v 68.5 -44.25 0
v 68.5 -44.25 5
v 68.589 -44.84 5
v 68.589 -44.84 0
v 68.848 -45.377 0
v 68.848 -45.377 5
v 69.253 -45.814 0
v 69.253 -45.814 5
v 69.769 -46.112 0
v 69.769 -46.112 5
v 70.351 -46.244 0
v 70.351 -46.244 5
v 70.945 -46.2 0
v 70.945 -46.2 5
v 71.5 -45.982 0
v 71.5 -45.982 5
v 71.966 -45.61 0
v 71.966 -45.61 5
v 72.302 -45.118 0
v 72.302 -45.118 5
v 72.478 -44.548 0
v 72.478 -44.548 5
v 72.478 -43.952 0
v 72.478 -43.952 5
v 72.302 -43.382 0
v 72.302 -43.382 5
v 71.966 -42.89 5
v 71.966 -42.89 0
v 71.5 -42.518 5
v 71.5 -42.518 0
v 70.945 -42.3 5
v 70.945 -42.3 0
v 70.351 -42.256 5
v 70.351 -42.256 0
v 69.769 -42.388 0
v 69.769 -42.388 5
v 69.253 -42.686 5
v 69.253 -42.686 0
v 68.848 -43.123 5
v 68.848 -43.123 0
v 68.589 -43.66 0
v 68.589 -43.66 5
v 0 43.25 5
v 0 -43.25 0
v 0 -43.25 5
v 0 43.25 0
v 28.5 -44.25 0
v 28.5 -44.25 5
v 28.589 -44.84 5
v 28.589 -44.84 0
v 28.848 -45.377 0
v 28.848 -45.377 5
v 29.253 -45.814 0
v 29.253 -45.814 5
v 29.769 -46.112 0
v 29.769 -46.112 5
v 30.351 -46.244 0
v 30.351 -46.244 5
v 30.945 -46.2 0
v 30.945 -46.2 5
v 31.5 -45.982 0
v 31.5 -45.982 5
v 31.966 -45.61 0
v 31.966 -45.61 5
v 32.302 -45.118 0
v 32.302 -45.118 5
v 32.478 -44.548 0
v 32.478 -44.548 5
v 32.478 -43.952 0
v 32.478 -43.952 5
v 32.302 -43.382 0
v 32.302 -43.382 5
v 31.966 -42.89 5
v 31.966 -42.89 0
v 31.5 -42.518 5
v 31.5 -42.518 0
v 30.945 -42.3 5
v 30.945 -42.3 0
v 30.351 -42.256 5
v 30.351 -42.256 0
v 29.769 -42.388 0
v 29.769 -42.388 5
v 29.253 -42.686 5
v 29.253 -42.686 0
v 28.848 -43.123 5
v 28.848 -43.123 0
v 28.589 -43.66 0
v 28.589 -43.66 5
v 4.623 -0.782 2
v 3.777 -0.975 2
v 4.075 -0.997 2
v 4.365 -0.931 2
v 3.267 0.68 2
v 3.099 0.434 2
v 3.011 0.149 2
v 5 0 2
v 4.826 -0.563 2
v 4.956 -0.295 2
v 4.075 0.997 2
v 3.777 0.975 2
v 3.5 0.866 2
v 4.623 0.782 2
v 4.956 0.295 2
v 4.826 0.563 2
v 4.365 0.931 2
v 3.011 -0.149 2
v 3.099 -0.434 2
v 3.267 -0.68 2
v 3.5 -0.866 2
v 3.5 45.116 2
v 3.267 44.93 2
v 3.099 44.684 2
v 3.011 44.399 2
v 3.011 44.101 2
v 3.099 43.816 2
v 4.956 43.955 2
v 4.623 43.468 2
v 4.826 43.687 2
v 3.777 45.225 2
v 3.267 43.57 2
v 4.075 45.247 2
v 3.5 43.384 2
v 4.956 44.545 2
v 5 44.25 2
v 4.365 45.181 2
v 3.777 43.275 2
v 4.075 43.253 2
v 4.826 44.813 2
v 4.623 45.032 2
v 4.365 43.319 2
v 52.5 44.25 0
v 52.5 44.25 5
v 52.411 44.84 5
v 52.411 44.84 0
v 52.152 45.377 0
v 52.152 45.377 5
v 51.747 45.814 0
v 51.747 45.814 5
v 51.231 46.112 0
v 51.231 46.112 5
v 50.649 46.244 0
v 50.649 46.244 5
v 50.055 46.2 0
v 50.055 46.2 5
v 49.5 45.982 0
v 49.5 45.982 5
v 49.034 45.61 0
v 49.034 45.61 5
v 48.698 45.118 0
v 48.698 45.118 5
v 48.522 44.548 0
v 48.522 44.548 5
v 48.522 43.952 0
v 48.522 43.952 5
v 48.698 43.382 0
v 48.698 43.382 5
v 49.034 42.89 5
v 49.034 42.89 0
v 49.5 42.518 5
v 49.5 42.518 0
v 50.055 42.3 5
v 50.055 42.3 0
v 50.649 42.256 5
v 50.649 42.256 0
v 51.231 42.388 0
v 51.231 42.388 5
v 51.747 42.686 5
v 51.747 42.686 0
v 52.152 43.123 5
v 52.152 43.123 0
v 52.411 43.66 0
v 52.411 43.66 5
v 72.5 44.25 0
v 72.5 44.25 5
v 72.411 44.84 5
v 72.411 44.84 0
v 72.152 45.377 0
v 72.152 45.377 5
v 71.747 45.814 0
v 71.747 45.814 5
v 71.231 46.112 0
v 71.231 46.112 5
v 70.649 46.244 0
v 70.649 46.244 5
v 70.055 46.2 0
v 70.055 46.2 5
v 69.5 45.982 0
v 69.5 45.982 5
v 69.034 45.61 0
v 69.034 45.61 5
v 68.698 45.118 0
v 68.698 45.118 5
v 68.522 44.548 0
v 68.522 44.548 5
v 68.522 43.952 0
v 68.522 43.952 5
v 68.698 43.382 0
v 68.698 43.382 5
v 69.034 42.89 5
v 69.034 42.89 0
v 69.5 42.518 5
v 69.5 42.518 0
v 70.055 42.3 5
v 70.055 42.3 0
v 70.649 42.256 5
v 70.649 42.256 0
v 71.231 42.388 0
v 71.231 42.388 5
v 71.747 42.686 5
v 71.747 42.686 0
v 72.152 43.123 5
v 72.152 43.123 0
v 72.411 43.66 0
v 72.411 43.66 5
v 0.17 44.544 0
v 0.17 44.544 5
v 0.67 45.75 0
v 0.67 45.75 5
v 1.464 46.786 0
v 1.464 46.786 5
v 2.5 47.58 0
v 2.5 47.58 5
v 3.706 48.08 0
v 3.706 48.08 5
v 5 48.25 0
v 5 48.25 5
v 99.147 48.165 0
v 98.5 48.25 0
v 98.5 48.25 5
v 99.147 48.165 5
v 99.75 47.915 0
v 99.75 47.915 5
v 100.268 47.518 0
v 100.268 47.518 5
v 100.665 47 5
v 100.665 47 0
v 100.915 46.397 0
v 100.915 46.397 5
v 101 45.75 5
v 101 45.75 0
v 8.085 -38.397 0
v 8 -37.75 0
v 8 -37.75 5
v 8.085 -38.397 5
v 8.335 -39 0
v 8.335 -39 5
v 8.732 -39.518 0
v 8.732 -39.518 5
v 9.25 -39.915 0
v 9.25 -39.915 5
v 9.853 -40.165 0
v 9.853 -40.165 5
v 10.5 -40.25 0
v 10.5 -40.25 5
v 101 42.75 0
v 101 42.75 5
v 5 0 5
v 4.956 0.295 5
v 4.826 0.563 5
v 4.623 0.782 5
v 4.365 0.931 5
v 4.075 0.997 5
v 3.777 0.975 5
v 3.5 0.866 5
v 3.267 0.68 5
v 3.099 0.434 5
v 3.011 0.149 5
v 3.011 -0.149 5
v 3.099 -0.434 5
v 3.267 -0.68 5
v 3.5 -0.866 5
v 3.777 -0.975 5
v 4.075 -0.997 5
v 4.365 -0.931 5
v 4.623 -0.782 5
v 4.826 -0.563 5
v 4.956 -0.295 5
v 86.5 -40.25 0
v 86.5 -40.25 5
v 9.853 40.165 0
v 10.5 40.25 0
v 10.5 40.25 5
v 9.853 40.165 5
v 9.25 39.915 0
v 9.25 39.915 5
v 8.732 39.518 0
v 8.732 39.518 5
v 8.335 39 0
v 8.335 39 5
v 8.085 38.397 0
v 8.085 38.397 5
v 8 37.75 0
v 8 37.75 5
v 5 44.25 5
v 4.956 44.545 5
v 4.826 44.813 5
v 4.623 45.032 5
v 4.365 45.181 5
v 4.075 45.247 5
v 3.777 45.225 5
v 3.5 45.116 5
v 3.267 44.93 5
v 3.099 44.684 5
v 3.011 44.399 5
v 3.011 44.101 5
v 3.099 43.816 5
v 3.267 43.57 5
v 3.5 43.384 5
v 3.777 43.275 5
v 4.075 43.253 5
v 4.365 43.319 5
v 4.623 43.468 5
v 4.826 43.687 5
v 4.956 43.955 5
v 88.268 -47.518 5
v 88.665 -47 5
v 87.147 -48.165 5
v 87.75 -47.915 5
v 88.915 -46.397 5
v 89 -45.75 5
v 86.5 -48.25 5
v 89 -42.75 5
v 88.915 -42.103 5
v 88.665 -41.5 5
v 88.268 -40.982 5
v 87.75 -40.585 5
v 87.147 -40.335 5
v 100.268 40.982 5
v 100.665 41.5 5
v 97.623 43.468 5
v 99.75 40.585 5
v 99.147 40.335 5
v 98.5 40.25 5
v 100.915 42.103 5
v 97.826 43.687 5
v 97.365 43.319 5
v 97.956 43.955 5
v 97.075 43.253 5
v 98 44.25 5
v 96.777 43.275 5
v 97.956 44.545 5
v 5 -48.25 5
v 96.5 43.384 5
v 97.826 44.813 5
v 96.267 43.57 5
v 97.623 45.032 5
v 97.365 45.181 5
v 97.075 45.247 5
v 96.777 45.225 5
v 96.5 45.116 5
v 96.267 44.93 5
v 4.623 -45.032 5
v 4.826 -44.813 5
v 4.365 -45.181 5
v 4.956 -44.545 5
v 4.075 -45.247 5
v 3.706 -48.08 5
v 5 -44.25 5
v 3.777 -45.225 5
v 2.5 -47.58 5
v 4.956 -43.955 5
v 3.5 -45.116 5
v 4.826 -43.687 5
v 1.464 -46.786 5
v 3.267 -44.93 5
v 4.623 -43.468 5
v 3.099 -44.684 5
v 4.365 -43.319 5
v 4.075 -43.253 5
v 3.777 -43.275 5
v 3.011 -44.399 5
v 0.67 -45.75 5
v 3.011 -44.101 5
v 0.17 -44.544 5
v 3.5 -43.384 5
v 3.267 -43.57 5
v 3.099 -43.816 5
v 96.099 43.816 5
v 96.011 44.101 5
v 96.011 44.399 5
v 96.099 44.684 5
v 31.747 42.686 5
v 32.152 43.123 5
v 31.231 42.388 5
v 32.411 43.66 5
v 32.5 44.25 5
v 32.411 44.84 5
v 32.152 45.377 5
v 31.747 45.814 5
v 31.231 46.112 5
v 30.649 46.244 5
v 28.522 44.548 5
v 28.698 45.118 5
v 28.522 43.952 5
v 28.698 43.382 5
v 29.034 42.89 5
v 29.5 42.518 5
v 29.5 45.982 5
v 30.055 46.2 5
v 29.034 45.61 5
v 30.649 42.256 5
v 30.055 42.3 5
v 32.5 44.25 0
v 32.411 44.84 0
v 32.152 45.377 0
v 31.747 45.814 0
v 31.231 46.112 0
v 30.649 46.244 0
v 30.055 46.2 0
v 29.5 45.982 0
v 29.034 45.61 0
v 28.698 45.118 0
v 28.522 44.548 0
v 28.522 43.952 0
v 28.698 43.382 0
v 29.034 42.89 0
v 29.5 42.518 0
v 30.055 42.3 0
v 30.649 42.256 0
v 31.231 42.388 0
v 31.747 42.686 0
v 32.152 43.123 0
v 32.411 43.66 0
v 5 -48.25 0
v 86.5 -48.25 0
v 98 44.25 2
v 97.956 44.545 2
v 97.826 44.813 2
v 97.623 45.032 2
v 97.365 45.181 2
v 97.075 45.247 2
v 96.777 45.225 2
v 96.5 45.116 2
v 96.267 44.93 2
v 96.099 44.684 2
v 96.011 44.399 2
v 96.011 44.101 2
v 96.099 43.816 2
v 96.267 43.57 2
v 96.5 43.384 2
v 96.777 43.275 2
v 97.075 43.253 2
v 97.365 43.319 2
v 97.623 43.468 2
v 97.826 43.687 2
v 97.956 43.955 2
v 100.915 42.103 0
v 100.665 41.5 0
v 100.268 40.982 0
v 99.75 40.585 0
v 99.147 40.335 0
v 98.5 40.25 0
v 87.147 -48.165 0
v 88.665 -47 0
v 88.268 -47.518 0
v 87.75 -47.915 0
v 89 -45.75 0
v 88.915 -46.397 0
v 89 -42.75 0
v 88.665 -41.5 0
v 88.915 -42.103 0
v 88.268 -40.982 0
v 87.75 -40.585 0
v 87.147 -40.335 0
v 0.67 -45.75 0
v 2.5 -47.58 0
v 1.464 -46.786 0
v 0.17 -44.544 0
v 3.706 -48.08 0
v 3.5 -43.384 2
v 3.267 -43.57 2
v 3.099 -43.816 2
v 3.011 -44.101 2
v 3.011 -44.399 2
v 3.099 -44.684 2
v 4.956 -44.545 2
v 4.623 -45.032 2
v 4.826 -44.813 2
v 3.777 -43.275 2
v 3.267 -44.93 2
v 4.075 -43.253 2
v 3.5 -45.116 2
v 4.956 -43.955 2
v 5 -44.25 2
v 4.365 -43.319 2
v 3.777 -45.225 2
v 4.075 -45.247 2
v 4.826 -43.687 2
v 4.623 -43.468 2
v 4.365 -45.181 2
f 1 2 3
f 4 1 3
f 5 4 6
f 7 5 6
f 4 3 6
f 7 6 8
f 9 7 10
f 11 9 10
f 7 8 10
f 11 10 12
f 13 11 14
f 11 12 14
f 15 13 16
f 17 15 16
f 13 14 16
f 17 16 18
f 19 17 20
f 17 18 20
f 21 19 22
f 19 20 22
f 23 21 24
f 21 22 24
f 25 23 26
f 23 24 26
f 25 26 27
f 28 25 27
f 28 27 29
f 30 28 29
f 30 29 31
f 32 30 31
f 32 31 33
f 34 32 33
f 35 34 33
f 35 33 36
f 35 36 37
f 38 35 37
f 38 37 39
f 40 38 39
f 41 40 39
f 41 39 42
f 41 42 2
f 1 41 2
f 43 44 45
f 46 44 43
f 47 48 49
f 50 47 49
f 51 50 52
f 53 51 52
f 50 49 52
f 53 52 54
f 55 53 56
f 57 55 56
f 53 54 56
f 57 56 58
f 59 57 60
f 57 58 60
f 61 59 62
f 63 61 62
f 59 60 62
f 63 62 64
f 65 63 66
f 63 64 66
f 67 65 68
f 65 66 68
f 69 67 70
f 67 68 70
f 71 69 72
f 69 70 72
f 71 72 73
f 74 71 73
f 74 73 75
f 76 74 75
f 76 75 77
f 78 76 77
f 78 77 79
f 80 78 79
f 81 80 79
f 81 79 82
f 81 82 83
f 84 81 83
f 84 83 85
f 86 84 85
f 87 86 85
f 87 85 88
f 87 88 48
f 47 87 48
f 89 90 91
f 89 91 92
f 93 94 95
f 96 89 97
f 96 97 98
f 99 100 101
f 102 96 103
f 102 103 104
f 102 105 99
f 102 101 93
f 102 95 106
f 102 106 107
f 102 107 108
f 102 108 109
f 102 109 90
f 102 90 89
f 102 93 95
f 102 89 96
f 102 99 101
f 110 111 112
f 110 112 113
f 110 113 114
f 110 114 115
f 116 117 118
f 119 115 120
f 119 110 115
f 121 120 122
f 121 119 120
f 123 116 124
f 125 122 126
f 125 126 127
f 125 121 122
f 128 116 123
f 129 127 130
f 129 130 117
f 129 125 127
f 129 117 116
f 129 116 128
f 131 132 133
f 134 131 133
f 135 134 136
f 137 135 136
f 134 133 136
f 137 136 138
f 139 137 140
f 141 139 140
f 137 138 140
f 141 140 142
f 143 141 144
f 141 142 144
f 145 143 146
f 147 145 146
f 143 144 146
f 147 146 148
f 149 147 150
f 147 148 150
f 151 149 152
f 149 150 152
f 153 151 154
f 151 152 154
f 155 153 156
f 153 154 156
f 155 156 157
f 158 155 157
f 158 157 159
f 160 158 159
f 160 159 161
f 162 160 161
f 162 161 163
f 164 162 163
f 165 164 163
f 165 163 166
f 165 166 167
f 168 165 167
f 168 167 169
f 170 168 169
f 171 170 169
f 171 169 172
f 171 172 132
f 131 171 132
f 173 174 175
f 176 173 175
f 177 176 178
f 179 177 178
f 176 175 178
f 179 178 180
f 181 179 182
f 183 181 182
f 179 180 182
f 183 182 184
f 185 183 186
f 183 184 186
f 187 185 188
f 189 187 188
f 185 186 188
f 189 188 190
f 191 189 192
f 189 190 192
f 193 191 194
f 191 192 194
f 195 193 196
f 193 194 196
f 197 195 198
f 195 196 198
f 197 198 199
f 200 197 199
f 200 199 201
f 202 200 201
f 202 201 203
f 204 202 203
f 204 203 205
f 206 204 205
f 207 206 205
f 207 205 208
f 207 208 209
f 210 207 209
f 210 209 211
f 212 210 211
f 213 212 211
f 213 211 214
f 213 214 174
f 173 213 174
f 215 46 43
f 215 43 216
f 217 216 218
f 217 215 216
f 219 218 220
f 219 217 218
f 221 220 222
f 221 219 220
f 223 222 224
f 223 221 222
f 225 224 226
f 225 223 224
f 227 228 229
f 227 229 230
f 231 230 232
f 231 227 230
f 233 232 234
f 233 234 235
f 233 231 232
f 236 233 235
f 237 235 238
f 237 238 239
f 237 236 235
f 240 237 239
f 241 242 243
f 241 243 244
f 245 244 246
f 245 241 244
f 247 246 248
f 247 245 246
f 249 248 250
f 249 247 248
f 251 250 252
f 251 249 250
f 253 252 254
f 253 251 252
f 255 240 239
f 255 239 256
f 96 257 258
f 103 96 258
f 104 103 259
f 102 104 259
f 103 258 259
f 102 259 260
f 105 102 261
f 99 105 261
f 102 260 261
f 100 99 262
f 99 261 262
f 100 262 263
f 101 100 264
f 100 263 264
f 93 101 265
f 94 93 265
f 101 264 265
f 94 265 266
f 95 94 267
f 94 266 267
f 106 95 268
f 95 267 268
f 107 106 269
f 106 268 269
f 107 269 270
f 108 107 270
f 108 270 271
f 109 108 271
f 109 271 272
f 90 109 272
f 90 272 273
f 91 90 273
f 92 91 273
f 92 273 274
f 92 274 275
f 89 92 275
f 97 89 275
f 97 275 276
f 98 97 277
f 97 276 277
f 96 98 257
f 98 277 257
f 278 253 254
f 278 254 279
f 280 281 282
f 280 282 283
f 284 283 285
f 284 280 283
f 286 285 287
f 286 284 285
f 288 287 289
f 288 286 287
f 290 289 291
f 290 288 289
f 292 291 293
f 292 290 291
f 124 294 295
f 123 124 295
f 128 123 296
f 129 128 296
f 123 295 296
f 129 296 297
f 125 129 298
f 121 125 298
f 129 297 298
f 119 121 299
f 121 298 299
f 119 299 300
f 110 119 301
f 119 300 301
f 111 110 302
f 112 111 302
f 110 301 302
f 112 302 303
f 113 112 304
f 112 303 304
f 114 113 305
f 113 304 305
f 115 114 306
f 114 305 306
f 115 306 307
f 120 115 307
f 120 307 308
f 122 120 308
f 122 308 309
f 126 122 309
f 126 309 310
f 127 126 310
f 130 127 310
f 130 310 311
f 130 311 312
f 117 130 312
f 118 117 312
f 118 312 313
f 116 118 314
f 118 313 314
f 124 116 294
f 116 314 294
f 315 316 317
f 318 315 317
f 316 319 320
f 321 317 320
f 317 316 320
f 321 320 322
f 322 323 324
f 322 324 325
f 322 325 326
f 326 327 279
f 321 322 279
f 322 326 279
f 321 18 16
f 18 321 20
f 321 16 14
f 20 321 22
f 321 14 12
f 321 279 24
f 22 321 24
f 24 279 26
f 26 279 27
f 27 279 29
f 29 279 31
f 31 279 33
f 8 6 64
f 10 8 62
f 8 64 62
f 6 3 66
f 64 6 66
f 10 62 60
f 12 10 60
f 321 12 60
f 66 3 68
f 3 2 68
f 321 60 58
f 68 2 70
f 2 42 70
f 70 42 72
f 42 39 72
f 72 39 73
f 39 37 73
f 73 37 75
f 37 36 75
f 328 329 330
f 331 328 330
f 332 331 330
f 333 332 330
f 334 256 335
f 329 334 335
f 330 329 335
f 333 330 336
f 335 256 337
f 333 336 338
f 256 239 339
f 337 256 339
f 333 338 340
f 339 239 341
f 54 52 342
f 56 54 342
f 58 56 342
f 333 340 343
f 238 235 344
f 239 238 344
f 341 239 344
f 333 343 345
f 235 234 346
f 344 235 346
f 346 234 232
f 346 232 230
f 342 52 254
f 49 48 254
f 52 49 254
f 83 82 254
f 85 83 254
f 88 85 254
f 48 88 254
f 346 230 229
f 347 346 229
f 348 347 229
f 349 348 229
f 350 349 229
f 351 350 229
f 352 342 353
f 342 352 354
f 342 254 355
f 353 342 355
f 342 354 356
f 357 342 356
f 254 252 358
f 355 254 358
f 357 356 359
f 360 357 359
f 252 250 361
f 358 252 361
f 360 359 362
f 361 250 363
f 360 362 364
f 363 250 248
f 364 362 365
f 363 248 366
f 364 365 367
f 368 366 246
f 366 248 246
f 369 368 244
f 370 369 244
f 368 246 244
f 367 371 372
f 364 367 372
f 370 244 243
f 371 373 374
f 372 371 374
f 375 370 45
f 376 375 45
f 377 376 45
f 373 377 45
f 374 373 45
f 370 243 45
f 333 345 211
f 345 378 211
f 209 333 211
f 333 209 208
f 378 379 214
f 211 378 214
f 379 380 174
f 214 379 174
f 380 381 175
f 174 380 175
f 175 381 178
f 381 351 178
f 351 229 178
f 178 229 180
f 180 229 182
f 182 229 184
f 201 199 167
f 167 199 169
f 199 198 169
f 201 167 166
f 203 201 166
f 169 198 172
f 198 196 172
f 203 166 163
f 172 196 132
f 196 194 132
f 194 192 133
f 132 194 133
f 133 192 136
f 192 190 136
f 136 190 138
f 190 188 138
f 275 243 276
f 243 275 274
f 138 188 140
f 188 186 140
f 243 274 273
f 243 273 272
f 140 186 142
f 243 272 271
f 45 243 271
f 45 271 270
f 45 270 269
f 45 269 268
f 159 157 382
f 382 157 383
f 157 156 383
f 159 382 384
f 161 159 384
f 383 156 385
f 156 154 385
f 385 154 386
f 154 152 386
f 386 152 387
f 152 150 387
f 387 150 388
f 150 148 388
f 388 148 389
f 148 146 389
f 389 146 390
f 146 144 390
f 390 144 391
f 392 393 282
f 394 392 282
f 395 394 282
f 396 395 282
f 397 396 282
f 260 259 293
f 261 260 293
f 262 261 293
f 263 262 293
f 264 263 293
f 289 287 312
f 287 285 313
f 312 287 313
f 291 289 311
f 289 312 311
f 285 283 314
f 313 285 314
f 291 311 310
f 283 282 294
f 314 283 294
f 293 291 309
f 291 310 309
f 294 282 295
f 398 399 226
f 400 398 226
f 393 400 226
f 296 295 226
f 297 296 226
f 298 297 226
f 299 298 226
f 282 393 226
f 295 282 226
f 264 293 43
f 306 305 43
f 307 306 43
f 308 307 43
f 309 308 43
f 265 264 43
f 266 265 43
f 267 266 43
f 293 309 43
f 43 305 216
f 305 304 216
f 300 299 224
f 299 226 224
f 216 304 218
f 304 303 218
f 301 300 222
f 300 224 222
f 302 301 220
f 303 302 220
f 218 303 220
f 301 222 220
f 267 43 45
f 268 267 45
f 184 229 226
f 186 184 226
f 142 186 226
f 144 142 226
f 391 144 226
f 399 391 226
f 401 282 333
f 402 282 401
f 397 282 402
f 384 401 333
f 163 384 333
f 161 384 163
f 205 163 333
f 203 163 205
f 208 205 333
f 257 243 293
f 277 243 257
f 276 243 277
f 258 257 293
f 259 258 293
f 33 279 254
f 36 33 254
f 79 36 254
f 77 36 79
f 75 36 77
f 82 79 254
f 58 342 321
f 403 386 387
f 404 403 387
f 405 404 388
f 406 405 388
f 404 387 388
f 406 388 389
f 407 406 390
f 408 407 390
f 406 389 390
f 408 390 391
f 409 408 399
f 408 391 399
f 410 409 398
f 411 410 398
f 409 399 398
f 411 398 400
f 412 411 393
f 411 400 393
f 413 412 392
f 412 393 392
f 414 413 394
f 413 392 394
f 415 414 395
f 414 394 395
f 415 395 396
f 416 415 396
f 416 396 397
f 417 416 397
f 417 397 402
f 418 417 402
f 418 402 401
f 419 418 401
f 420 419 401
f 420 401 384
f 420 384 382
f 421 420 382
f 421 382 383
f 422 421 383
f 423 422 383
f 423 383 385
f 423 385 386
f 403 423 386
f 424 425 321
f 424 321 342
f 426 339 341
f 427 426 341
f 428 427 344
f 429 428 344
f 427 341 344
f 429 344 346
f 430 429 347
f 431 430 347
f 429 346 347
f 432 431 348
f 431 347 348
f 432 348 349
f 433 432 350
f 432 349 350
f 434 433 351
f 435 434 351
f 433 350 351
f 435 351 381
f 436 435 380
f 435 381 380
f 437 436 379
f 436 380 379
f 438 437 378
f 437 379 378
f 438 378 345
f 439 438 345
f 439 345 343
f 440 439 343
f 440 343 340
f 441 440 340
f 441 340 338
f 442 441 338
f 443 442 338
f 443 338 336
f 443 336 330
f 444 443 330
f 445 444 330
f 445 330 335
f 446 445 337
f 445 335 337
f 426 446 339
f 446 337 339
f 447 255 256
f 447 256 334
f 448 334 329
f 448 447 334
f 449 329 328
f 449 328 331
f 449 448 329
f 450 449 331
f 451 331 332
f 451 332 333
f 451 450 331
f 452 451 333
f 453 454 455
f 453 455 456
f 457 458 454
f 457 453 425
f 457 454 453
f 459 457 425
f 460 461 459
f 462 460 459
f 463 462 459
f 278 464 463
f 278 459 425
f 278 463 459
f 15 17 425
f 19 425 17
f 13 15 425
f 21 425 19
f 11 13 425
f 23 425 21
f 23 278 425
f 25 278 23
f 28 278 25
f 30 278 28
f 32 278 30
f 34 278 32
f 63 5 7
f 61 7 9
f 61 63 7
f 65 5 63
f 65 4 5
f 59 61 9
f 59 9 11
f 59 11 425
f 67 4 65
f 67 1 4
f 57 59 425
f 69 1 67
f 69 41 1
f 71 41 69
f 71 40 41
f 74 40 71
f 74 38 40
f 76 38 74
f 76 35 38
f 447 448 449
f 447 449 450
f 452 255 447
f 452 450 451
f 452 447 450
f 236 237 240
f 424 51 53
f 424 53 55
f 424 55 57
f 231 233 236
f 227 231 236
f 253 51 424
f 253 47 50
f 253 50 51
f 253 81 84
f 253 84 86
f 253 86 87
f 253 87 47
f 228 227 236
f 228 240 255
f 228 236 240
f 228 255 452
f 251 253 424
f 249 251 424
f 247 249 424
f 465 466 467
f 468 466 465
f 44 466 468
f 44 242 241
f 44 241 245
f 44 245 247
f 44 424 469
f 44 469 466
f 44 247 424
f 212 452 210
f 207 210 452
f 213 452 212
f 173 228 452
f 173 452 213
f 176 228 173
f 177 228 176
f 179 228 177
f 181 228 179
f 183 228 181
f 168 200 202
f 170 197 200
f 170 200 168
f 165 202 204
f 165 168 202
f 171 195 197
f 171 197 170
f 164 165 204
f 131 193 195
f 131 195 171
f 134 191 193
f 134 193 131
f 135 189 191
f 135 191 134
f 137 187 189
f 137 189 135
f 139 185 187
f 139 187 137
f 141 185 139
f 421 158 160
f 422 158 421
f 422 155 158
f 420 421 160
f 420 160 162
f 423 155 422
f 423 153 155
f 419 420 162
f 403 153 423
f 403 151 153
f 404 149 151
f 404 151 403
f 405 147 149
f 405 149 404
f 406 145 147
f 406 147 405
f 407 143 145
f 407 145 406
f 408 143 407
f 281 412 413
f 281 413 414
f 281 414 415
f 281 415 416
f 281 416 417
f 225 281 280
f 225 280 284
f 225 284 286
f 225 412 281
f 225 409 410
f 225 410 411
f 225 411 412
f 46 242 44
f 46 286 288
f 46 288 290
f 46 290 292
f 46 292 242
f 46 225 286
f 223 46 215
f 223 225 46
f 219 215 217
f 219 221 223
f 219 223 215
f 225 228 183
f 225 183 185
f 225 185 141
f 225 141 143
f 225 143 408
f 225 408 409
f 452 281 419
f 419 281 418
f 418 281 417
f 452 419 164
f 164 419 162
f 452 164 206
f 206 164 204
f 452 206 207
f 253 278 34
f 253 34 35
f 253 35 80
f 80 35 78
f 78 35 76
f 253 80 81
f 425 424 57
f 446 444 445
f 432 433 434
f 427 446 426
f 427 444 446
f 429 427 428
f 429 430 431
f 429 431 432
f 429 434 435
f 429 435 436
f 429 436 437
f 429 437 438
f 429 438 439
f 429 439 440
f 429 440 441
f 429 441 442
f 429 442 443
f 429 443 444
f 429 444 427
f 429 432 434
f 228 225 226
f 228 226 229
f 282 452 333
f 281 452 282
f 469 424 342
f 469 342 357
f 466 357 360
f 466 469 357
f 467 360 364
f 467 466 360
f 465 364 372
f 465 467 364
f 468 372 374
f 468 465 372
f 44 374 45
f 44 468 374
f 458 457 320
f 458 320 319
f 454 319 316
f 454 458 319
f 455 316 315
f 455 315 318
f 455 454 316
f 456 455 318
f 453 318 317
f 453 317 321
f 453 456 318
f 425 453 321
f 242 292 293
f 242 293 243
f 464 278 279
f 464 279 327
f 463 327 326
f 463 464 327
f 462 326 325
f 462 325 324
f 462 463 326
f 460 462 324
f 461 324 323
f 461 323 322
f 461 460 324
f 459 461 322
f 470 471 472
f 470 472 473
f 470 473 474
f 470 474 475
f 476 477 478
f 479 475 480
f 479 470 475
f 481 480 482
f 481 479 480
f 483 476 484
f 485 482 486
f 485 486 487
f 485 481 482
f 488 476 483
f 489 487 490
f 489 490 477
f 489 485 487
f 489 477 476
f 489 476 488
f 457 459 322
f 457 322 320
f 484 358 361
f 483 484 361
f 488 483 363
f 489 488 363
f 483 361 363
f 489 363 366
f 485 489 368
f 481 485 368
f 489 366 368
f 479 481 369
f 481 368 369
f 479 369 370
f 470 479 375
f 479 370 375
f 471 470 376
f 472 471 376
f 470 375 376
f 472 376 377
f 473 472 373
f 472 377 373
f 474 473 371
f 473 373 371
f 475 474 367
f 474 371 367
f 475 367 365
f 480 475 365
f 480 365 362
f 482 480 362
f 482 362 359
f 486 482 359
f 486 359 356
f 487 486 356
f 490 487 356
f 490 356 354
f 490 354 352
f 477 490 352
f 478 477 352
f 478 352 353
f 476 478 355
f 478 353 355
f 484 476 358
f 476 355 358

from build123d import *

# Parameters (mm, degrees)
BOSS_EXTRUDE1_DEPTH = 5
SKETCH4_R           = 2
CUT_EXTRUDE1_DEPTH  = 113.04491287
SKETCH5_R           = 1
CUT_EXTRUDE2_DEPTH  = 3


with BuildPart() as part:
    # Sketch1 → Boss-Extrude1 (new body)
    with BuildSketch(Plane.XY):
        with BuildLine():
            Line((0, -43.25), (0, 43.25))
            ThreePointArc((0, 43.25), (1.464466094, 46.785533906), (5, 48.25))
            Line((5, 48.25), (98.5, 48.25))
            ThreePointArc((98.5, 48.25), (100.267766953, 47.517766953), (101, 45.75))
            Line((101, 45.75), (101, 42.75))
            ThreePointArc((101, 42.75), (100.267766953, 40.982233047), (98.5, 40.25))
            Line((98.5, 40.25), (10.5, 40.25))
            ThreePointArc((10.5, 40.25), (8.732233047, 39.517766953), (8, 37.75))
            Line((8, 37.75), (8, -37.75))
            ThreePointArc((8, -37.75), (8.732233047, -39.517766953), (10.5, -40.25))
            Line((10.5, -40.25), (86.5, -40.25))
            ThreePointArc((86.5, -40.25), (88.267766953, -40.982233047), (89, -42.75))
            Line((89, -42.75), (89, -45.75))
            ThreePointArc((89, -45.75), (88.267766953, -47.517766953), (86.5, -48.25))
            Line((86.5, -48.25), (5, -48.25))
            ThreePointArc((5, -48.25), (1.464466094, -46.785533906), (0, -43.25))
        make_face()
    extrude(amount=BOSS_EXTRUDE1_DEPTH)

    # Sketch4 → Cut-Extrude1 (cut, through all)
    with BuildSketch(Plane.XY.offset(5)):
        with Locations((70.5, 44.25)):
            Circle(SKETCH4_R)
        with Locations((30.5, 44.25)):
            Circle(SKETCH4_R)
        with Locations(Location((70.5, -44.25, 0), (0, 0, 180))):
            Circle(SKETCH4_R)
        with Locations(Location((30.5, -44.25, 0), (0, 0, 180))):
            Circle(SKETCH4_R)
        with Locations((50.5, 44.25)):
            Circle(SKETCH4_R)
    extrude(amount=-CUT_EXTRUDE1_DEPTH, mode=Mode.SUBTRACT)

    # Sketch5 → Cut-Extrude2 (cut)
    with BuildSketch(Plane.XY.offset(5)):
        with Locations((4, 44.25)):
            Circle(SKETCH5_R)
        with Locations((4, 0)):
            Circle(SKETCH5_R)
        with Locations((4, -44.25)):
            Circle(SKETCH5_R)
        with Locations((97, 44.25)):
            Circle(SKETCH5_R)
    extrude(amount=-CUT_EXTRUDE2_DEPTH, mode=Mode.SUBTRACT)


solid = part.part
